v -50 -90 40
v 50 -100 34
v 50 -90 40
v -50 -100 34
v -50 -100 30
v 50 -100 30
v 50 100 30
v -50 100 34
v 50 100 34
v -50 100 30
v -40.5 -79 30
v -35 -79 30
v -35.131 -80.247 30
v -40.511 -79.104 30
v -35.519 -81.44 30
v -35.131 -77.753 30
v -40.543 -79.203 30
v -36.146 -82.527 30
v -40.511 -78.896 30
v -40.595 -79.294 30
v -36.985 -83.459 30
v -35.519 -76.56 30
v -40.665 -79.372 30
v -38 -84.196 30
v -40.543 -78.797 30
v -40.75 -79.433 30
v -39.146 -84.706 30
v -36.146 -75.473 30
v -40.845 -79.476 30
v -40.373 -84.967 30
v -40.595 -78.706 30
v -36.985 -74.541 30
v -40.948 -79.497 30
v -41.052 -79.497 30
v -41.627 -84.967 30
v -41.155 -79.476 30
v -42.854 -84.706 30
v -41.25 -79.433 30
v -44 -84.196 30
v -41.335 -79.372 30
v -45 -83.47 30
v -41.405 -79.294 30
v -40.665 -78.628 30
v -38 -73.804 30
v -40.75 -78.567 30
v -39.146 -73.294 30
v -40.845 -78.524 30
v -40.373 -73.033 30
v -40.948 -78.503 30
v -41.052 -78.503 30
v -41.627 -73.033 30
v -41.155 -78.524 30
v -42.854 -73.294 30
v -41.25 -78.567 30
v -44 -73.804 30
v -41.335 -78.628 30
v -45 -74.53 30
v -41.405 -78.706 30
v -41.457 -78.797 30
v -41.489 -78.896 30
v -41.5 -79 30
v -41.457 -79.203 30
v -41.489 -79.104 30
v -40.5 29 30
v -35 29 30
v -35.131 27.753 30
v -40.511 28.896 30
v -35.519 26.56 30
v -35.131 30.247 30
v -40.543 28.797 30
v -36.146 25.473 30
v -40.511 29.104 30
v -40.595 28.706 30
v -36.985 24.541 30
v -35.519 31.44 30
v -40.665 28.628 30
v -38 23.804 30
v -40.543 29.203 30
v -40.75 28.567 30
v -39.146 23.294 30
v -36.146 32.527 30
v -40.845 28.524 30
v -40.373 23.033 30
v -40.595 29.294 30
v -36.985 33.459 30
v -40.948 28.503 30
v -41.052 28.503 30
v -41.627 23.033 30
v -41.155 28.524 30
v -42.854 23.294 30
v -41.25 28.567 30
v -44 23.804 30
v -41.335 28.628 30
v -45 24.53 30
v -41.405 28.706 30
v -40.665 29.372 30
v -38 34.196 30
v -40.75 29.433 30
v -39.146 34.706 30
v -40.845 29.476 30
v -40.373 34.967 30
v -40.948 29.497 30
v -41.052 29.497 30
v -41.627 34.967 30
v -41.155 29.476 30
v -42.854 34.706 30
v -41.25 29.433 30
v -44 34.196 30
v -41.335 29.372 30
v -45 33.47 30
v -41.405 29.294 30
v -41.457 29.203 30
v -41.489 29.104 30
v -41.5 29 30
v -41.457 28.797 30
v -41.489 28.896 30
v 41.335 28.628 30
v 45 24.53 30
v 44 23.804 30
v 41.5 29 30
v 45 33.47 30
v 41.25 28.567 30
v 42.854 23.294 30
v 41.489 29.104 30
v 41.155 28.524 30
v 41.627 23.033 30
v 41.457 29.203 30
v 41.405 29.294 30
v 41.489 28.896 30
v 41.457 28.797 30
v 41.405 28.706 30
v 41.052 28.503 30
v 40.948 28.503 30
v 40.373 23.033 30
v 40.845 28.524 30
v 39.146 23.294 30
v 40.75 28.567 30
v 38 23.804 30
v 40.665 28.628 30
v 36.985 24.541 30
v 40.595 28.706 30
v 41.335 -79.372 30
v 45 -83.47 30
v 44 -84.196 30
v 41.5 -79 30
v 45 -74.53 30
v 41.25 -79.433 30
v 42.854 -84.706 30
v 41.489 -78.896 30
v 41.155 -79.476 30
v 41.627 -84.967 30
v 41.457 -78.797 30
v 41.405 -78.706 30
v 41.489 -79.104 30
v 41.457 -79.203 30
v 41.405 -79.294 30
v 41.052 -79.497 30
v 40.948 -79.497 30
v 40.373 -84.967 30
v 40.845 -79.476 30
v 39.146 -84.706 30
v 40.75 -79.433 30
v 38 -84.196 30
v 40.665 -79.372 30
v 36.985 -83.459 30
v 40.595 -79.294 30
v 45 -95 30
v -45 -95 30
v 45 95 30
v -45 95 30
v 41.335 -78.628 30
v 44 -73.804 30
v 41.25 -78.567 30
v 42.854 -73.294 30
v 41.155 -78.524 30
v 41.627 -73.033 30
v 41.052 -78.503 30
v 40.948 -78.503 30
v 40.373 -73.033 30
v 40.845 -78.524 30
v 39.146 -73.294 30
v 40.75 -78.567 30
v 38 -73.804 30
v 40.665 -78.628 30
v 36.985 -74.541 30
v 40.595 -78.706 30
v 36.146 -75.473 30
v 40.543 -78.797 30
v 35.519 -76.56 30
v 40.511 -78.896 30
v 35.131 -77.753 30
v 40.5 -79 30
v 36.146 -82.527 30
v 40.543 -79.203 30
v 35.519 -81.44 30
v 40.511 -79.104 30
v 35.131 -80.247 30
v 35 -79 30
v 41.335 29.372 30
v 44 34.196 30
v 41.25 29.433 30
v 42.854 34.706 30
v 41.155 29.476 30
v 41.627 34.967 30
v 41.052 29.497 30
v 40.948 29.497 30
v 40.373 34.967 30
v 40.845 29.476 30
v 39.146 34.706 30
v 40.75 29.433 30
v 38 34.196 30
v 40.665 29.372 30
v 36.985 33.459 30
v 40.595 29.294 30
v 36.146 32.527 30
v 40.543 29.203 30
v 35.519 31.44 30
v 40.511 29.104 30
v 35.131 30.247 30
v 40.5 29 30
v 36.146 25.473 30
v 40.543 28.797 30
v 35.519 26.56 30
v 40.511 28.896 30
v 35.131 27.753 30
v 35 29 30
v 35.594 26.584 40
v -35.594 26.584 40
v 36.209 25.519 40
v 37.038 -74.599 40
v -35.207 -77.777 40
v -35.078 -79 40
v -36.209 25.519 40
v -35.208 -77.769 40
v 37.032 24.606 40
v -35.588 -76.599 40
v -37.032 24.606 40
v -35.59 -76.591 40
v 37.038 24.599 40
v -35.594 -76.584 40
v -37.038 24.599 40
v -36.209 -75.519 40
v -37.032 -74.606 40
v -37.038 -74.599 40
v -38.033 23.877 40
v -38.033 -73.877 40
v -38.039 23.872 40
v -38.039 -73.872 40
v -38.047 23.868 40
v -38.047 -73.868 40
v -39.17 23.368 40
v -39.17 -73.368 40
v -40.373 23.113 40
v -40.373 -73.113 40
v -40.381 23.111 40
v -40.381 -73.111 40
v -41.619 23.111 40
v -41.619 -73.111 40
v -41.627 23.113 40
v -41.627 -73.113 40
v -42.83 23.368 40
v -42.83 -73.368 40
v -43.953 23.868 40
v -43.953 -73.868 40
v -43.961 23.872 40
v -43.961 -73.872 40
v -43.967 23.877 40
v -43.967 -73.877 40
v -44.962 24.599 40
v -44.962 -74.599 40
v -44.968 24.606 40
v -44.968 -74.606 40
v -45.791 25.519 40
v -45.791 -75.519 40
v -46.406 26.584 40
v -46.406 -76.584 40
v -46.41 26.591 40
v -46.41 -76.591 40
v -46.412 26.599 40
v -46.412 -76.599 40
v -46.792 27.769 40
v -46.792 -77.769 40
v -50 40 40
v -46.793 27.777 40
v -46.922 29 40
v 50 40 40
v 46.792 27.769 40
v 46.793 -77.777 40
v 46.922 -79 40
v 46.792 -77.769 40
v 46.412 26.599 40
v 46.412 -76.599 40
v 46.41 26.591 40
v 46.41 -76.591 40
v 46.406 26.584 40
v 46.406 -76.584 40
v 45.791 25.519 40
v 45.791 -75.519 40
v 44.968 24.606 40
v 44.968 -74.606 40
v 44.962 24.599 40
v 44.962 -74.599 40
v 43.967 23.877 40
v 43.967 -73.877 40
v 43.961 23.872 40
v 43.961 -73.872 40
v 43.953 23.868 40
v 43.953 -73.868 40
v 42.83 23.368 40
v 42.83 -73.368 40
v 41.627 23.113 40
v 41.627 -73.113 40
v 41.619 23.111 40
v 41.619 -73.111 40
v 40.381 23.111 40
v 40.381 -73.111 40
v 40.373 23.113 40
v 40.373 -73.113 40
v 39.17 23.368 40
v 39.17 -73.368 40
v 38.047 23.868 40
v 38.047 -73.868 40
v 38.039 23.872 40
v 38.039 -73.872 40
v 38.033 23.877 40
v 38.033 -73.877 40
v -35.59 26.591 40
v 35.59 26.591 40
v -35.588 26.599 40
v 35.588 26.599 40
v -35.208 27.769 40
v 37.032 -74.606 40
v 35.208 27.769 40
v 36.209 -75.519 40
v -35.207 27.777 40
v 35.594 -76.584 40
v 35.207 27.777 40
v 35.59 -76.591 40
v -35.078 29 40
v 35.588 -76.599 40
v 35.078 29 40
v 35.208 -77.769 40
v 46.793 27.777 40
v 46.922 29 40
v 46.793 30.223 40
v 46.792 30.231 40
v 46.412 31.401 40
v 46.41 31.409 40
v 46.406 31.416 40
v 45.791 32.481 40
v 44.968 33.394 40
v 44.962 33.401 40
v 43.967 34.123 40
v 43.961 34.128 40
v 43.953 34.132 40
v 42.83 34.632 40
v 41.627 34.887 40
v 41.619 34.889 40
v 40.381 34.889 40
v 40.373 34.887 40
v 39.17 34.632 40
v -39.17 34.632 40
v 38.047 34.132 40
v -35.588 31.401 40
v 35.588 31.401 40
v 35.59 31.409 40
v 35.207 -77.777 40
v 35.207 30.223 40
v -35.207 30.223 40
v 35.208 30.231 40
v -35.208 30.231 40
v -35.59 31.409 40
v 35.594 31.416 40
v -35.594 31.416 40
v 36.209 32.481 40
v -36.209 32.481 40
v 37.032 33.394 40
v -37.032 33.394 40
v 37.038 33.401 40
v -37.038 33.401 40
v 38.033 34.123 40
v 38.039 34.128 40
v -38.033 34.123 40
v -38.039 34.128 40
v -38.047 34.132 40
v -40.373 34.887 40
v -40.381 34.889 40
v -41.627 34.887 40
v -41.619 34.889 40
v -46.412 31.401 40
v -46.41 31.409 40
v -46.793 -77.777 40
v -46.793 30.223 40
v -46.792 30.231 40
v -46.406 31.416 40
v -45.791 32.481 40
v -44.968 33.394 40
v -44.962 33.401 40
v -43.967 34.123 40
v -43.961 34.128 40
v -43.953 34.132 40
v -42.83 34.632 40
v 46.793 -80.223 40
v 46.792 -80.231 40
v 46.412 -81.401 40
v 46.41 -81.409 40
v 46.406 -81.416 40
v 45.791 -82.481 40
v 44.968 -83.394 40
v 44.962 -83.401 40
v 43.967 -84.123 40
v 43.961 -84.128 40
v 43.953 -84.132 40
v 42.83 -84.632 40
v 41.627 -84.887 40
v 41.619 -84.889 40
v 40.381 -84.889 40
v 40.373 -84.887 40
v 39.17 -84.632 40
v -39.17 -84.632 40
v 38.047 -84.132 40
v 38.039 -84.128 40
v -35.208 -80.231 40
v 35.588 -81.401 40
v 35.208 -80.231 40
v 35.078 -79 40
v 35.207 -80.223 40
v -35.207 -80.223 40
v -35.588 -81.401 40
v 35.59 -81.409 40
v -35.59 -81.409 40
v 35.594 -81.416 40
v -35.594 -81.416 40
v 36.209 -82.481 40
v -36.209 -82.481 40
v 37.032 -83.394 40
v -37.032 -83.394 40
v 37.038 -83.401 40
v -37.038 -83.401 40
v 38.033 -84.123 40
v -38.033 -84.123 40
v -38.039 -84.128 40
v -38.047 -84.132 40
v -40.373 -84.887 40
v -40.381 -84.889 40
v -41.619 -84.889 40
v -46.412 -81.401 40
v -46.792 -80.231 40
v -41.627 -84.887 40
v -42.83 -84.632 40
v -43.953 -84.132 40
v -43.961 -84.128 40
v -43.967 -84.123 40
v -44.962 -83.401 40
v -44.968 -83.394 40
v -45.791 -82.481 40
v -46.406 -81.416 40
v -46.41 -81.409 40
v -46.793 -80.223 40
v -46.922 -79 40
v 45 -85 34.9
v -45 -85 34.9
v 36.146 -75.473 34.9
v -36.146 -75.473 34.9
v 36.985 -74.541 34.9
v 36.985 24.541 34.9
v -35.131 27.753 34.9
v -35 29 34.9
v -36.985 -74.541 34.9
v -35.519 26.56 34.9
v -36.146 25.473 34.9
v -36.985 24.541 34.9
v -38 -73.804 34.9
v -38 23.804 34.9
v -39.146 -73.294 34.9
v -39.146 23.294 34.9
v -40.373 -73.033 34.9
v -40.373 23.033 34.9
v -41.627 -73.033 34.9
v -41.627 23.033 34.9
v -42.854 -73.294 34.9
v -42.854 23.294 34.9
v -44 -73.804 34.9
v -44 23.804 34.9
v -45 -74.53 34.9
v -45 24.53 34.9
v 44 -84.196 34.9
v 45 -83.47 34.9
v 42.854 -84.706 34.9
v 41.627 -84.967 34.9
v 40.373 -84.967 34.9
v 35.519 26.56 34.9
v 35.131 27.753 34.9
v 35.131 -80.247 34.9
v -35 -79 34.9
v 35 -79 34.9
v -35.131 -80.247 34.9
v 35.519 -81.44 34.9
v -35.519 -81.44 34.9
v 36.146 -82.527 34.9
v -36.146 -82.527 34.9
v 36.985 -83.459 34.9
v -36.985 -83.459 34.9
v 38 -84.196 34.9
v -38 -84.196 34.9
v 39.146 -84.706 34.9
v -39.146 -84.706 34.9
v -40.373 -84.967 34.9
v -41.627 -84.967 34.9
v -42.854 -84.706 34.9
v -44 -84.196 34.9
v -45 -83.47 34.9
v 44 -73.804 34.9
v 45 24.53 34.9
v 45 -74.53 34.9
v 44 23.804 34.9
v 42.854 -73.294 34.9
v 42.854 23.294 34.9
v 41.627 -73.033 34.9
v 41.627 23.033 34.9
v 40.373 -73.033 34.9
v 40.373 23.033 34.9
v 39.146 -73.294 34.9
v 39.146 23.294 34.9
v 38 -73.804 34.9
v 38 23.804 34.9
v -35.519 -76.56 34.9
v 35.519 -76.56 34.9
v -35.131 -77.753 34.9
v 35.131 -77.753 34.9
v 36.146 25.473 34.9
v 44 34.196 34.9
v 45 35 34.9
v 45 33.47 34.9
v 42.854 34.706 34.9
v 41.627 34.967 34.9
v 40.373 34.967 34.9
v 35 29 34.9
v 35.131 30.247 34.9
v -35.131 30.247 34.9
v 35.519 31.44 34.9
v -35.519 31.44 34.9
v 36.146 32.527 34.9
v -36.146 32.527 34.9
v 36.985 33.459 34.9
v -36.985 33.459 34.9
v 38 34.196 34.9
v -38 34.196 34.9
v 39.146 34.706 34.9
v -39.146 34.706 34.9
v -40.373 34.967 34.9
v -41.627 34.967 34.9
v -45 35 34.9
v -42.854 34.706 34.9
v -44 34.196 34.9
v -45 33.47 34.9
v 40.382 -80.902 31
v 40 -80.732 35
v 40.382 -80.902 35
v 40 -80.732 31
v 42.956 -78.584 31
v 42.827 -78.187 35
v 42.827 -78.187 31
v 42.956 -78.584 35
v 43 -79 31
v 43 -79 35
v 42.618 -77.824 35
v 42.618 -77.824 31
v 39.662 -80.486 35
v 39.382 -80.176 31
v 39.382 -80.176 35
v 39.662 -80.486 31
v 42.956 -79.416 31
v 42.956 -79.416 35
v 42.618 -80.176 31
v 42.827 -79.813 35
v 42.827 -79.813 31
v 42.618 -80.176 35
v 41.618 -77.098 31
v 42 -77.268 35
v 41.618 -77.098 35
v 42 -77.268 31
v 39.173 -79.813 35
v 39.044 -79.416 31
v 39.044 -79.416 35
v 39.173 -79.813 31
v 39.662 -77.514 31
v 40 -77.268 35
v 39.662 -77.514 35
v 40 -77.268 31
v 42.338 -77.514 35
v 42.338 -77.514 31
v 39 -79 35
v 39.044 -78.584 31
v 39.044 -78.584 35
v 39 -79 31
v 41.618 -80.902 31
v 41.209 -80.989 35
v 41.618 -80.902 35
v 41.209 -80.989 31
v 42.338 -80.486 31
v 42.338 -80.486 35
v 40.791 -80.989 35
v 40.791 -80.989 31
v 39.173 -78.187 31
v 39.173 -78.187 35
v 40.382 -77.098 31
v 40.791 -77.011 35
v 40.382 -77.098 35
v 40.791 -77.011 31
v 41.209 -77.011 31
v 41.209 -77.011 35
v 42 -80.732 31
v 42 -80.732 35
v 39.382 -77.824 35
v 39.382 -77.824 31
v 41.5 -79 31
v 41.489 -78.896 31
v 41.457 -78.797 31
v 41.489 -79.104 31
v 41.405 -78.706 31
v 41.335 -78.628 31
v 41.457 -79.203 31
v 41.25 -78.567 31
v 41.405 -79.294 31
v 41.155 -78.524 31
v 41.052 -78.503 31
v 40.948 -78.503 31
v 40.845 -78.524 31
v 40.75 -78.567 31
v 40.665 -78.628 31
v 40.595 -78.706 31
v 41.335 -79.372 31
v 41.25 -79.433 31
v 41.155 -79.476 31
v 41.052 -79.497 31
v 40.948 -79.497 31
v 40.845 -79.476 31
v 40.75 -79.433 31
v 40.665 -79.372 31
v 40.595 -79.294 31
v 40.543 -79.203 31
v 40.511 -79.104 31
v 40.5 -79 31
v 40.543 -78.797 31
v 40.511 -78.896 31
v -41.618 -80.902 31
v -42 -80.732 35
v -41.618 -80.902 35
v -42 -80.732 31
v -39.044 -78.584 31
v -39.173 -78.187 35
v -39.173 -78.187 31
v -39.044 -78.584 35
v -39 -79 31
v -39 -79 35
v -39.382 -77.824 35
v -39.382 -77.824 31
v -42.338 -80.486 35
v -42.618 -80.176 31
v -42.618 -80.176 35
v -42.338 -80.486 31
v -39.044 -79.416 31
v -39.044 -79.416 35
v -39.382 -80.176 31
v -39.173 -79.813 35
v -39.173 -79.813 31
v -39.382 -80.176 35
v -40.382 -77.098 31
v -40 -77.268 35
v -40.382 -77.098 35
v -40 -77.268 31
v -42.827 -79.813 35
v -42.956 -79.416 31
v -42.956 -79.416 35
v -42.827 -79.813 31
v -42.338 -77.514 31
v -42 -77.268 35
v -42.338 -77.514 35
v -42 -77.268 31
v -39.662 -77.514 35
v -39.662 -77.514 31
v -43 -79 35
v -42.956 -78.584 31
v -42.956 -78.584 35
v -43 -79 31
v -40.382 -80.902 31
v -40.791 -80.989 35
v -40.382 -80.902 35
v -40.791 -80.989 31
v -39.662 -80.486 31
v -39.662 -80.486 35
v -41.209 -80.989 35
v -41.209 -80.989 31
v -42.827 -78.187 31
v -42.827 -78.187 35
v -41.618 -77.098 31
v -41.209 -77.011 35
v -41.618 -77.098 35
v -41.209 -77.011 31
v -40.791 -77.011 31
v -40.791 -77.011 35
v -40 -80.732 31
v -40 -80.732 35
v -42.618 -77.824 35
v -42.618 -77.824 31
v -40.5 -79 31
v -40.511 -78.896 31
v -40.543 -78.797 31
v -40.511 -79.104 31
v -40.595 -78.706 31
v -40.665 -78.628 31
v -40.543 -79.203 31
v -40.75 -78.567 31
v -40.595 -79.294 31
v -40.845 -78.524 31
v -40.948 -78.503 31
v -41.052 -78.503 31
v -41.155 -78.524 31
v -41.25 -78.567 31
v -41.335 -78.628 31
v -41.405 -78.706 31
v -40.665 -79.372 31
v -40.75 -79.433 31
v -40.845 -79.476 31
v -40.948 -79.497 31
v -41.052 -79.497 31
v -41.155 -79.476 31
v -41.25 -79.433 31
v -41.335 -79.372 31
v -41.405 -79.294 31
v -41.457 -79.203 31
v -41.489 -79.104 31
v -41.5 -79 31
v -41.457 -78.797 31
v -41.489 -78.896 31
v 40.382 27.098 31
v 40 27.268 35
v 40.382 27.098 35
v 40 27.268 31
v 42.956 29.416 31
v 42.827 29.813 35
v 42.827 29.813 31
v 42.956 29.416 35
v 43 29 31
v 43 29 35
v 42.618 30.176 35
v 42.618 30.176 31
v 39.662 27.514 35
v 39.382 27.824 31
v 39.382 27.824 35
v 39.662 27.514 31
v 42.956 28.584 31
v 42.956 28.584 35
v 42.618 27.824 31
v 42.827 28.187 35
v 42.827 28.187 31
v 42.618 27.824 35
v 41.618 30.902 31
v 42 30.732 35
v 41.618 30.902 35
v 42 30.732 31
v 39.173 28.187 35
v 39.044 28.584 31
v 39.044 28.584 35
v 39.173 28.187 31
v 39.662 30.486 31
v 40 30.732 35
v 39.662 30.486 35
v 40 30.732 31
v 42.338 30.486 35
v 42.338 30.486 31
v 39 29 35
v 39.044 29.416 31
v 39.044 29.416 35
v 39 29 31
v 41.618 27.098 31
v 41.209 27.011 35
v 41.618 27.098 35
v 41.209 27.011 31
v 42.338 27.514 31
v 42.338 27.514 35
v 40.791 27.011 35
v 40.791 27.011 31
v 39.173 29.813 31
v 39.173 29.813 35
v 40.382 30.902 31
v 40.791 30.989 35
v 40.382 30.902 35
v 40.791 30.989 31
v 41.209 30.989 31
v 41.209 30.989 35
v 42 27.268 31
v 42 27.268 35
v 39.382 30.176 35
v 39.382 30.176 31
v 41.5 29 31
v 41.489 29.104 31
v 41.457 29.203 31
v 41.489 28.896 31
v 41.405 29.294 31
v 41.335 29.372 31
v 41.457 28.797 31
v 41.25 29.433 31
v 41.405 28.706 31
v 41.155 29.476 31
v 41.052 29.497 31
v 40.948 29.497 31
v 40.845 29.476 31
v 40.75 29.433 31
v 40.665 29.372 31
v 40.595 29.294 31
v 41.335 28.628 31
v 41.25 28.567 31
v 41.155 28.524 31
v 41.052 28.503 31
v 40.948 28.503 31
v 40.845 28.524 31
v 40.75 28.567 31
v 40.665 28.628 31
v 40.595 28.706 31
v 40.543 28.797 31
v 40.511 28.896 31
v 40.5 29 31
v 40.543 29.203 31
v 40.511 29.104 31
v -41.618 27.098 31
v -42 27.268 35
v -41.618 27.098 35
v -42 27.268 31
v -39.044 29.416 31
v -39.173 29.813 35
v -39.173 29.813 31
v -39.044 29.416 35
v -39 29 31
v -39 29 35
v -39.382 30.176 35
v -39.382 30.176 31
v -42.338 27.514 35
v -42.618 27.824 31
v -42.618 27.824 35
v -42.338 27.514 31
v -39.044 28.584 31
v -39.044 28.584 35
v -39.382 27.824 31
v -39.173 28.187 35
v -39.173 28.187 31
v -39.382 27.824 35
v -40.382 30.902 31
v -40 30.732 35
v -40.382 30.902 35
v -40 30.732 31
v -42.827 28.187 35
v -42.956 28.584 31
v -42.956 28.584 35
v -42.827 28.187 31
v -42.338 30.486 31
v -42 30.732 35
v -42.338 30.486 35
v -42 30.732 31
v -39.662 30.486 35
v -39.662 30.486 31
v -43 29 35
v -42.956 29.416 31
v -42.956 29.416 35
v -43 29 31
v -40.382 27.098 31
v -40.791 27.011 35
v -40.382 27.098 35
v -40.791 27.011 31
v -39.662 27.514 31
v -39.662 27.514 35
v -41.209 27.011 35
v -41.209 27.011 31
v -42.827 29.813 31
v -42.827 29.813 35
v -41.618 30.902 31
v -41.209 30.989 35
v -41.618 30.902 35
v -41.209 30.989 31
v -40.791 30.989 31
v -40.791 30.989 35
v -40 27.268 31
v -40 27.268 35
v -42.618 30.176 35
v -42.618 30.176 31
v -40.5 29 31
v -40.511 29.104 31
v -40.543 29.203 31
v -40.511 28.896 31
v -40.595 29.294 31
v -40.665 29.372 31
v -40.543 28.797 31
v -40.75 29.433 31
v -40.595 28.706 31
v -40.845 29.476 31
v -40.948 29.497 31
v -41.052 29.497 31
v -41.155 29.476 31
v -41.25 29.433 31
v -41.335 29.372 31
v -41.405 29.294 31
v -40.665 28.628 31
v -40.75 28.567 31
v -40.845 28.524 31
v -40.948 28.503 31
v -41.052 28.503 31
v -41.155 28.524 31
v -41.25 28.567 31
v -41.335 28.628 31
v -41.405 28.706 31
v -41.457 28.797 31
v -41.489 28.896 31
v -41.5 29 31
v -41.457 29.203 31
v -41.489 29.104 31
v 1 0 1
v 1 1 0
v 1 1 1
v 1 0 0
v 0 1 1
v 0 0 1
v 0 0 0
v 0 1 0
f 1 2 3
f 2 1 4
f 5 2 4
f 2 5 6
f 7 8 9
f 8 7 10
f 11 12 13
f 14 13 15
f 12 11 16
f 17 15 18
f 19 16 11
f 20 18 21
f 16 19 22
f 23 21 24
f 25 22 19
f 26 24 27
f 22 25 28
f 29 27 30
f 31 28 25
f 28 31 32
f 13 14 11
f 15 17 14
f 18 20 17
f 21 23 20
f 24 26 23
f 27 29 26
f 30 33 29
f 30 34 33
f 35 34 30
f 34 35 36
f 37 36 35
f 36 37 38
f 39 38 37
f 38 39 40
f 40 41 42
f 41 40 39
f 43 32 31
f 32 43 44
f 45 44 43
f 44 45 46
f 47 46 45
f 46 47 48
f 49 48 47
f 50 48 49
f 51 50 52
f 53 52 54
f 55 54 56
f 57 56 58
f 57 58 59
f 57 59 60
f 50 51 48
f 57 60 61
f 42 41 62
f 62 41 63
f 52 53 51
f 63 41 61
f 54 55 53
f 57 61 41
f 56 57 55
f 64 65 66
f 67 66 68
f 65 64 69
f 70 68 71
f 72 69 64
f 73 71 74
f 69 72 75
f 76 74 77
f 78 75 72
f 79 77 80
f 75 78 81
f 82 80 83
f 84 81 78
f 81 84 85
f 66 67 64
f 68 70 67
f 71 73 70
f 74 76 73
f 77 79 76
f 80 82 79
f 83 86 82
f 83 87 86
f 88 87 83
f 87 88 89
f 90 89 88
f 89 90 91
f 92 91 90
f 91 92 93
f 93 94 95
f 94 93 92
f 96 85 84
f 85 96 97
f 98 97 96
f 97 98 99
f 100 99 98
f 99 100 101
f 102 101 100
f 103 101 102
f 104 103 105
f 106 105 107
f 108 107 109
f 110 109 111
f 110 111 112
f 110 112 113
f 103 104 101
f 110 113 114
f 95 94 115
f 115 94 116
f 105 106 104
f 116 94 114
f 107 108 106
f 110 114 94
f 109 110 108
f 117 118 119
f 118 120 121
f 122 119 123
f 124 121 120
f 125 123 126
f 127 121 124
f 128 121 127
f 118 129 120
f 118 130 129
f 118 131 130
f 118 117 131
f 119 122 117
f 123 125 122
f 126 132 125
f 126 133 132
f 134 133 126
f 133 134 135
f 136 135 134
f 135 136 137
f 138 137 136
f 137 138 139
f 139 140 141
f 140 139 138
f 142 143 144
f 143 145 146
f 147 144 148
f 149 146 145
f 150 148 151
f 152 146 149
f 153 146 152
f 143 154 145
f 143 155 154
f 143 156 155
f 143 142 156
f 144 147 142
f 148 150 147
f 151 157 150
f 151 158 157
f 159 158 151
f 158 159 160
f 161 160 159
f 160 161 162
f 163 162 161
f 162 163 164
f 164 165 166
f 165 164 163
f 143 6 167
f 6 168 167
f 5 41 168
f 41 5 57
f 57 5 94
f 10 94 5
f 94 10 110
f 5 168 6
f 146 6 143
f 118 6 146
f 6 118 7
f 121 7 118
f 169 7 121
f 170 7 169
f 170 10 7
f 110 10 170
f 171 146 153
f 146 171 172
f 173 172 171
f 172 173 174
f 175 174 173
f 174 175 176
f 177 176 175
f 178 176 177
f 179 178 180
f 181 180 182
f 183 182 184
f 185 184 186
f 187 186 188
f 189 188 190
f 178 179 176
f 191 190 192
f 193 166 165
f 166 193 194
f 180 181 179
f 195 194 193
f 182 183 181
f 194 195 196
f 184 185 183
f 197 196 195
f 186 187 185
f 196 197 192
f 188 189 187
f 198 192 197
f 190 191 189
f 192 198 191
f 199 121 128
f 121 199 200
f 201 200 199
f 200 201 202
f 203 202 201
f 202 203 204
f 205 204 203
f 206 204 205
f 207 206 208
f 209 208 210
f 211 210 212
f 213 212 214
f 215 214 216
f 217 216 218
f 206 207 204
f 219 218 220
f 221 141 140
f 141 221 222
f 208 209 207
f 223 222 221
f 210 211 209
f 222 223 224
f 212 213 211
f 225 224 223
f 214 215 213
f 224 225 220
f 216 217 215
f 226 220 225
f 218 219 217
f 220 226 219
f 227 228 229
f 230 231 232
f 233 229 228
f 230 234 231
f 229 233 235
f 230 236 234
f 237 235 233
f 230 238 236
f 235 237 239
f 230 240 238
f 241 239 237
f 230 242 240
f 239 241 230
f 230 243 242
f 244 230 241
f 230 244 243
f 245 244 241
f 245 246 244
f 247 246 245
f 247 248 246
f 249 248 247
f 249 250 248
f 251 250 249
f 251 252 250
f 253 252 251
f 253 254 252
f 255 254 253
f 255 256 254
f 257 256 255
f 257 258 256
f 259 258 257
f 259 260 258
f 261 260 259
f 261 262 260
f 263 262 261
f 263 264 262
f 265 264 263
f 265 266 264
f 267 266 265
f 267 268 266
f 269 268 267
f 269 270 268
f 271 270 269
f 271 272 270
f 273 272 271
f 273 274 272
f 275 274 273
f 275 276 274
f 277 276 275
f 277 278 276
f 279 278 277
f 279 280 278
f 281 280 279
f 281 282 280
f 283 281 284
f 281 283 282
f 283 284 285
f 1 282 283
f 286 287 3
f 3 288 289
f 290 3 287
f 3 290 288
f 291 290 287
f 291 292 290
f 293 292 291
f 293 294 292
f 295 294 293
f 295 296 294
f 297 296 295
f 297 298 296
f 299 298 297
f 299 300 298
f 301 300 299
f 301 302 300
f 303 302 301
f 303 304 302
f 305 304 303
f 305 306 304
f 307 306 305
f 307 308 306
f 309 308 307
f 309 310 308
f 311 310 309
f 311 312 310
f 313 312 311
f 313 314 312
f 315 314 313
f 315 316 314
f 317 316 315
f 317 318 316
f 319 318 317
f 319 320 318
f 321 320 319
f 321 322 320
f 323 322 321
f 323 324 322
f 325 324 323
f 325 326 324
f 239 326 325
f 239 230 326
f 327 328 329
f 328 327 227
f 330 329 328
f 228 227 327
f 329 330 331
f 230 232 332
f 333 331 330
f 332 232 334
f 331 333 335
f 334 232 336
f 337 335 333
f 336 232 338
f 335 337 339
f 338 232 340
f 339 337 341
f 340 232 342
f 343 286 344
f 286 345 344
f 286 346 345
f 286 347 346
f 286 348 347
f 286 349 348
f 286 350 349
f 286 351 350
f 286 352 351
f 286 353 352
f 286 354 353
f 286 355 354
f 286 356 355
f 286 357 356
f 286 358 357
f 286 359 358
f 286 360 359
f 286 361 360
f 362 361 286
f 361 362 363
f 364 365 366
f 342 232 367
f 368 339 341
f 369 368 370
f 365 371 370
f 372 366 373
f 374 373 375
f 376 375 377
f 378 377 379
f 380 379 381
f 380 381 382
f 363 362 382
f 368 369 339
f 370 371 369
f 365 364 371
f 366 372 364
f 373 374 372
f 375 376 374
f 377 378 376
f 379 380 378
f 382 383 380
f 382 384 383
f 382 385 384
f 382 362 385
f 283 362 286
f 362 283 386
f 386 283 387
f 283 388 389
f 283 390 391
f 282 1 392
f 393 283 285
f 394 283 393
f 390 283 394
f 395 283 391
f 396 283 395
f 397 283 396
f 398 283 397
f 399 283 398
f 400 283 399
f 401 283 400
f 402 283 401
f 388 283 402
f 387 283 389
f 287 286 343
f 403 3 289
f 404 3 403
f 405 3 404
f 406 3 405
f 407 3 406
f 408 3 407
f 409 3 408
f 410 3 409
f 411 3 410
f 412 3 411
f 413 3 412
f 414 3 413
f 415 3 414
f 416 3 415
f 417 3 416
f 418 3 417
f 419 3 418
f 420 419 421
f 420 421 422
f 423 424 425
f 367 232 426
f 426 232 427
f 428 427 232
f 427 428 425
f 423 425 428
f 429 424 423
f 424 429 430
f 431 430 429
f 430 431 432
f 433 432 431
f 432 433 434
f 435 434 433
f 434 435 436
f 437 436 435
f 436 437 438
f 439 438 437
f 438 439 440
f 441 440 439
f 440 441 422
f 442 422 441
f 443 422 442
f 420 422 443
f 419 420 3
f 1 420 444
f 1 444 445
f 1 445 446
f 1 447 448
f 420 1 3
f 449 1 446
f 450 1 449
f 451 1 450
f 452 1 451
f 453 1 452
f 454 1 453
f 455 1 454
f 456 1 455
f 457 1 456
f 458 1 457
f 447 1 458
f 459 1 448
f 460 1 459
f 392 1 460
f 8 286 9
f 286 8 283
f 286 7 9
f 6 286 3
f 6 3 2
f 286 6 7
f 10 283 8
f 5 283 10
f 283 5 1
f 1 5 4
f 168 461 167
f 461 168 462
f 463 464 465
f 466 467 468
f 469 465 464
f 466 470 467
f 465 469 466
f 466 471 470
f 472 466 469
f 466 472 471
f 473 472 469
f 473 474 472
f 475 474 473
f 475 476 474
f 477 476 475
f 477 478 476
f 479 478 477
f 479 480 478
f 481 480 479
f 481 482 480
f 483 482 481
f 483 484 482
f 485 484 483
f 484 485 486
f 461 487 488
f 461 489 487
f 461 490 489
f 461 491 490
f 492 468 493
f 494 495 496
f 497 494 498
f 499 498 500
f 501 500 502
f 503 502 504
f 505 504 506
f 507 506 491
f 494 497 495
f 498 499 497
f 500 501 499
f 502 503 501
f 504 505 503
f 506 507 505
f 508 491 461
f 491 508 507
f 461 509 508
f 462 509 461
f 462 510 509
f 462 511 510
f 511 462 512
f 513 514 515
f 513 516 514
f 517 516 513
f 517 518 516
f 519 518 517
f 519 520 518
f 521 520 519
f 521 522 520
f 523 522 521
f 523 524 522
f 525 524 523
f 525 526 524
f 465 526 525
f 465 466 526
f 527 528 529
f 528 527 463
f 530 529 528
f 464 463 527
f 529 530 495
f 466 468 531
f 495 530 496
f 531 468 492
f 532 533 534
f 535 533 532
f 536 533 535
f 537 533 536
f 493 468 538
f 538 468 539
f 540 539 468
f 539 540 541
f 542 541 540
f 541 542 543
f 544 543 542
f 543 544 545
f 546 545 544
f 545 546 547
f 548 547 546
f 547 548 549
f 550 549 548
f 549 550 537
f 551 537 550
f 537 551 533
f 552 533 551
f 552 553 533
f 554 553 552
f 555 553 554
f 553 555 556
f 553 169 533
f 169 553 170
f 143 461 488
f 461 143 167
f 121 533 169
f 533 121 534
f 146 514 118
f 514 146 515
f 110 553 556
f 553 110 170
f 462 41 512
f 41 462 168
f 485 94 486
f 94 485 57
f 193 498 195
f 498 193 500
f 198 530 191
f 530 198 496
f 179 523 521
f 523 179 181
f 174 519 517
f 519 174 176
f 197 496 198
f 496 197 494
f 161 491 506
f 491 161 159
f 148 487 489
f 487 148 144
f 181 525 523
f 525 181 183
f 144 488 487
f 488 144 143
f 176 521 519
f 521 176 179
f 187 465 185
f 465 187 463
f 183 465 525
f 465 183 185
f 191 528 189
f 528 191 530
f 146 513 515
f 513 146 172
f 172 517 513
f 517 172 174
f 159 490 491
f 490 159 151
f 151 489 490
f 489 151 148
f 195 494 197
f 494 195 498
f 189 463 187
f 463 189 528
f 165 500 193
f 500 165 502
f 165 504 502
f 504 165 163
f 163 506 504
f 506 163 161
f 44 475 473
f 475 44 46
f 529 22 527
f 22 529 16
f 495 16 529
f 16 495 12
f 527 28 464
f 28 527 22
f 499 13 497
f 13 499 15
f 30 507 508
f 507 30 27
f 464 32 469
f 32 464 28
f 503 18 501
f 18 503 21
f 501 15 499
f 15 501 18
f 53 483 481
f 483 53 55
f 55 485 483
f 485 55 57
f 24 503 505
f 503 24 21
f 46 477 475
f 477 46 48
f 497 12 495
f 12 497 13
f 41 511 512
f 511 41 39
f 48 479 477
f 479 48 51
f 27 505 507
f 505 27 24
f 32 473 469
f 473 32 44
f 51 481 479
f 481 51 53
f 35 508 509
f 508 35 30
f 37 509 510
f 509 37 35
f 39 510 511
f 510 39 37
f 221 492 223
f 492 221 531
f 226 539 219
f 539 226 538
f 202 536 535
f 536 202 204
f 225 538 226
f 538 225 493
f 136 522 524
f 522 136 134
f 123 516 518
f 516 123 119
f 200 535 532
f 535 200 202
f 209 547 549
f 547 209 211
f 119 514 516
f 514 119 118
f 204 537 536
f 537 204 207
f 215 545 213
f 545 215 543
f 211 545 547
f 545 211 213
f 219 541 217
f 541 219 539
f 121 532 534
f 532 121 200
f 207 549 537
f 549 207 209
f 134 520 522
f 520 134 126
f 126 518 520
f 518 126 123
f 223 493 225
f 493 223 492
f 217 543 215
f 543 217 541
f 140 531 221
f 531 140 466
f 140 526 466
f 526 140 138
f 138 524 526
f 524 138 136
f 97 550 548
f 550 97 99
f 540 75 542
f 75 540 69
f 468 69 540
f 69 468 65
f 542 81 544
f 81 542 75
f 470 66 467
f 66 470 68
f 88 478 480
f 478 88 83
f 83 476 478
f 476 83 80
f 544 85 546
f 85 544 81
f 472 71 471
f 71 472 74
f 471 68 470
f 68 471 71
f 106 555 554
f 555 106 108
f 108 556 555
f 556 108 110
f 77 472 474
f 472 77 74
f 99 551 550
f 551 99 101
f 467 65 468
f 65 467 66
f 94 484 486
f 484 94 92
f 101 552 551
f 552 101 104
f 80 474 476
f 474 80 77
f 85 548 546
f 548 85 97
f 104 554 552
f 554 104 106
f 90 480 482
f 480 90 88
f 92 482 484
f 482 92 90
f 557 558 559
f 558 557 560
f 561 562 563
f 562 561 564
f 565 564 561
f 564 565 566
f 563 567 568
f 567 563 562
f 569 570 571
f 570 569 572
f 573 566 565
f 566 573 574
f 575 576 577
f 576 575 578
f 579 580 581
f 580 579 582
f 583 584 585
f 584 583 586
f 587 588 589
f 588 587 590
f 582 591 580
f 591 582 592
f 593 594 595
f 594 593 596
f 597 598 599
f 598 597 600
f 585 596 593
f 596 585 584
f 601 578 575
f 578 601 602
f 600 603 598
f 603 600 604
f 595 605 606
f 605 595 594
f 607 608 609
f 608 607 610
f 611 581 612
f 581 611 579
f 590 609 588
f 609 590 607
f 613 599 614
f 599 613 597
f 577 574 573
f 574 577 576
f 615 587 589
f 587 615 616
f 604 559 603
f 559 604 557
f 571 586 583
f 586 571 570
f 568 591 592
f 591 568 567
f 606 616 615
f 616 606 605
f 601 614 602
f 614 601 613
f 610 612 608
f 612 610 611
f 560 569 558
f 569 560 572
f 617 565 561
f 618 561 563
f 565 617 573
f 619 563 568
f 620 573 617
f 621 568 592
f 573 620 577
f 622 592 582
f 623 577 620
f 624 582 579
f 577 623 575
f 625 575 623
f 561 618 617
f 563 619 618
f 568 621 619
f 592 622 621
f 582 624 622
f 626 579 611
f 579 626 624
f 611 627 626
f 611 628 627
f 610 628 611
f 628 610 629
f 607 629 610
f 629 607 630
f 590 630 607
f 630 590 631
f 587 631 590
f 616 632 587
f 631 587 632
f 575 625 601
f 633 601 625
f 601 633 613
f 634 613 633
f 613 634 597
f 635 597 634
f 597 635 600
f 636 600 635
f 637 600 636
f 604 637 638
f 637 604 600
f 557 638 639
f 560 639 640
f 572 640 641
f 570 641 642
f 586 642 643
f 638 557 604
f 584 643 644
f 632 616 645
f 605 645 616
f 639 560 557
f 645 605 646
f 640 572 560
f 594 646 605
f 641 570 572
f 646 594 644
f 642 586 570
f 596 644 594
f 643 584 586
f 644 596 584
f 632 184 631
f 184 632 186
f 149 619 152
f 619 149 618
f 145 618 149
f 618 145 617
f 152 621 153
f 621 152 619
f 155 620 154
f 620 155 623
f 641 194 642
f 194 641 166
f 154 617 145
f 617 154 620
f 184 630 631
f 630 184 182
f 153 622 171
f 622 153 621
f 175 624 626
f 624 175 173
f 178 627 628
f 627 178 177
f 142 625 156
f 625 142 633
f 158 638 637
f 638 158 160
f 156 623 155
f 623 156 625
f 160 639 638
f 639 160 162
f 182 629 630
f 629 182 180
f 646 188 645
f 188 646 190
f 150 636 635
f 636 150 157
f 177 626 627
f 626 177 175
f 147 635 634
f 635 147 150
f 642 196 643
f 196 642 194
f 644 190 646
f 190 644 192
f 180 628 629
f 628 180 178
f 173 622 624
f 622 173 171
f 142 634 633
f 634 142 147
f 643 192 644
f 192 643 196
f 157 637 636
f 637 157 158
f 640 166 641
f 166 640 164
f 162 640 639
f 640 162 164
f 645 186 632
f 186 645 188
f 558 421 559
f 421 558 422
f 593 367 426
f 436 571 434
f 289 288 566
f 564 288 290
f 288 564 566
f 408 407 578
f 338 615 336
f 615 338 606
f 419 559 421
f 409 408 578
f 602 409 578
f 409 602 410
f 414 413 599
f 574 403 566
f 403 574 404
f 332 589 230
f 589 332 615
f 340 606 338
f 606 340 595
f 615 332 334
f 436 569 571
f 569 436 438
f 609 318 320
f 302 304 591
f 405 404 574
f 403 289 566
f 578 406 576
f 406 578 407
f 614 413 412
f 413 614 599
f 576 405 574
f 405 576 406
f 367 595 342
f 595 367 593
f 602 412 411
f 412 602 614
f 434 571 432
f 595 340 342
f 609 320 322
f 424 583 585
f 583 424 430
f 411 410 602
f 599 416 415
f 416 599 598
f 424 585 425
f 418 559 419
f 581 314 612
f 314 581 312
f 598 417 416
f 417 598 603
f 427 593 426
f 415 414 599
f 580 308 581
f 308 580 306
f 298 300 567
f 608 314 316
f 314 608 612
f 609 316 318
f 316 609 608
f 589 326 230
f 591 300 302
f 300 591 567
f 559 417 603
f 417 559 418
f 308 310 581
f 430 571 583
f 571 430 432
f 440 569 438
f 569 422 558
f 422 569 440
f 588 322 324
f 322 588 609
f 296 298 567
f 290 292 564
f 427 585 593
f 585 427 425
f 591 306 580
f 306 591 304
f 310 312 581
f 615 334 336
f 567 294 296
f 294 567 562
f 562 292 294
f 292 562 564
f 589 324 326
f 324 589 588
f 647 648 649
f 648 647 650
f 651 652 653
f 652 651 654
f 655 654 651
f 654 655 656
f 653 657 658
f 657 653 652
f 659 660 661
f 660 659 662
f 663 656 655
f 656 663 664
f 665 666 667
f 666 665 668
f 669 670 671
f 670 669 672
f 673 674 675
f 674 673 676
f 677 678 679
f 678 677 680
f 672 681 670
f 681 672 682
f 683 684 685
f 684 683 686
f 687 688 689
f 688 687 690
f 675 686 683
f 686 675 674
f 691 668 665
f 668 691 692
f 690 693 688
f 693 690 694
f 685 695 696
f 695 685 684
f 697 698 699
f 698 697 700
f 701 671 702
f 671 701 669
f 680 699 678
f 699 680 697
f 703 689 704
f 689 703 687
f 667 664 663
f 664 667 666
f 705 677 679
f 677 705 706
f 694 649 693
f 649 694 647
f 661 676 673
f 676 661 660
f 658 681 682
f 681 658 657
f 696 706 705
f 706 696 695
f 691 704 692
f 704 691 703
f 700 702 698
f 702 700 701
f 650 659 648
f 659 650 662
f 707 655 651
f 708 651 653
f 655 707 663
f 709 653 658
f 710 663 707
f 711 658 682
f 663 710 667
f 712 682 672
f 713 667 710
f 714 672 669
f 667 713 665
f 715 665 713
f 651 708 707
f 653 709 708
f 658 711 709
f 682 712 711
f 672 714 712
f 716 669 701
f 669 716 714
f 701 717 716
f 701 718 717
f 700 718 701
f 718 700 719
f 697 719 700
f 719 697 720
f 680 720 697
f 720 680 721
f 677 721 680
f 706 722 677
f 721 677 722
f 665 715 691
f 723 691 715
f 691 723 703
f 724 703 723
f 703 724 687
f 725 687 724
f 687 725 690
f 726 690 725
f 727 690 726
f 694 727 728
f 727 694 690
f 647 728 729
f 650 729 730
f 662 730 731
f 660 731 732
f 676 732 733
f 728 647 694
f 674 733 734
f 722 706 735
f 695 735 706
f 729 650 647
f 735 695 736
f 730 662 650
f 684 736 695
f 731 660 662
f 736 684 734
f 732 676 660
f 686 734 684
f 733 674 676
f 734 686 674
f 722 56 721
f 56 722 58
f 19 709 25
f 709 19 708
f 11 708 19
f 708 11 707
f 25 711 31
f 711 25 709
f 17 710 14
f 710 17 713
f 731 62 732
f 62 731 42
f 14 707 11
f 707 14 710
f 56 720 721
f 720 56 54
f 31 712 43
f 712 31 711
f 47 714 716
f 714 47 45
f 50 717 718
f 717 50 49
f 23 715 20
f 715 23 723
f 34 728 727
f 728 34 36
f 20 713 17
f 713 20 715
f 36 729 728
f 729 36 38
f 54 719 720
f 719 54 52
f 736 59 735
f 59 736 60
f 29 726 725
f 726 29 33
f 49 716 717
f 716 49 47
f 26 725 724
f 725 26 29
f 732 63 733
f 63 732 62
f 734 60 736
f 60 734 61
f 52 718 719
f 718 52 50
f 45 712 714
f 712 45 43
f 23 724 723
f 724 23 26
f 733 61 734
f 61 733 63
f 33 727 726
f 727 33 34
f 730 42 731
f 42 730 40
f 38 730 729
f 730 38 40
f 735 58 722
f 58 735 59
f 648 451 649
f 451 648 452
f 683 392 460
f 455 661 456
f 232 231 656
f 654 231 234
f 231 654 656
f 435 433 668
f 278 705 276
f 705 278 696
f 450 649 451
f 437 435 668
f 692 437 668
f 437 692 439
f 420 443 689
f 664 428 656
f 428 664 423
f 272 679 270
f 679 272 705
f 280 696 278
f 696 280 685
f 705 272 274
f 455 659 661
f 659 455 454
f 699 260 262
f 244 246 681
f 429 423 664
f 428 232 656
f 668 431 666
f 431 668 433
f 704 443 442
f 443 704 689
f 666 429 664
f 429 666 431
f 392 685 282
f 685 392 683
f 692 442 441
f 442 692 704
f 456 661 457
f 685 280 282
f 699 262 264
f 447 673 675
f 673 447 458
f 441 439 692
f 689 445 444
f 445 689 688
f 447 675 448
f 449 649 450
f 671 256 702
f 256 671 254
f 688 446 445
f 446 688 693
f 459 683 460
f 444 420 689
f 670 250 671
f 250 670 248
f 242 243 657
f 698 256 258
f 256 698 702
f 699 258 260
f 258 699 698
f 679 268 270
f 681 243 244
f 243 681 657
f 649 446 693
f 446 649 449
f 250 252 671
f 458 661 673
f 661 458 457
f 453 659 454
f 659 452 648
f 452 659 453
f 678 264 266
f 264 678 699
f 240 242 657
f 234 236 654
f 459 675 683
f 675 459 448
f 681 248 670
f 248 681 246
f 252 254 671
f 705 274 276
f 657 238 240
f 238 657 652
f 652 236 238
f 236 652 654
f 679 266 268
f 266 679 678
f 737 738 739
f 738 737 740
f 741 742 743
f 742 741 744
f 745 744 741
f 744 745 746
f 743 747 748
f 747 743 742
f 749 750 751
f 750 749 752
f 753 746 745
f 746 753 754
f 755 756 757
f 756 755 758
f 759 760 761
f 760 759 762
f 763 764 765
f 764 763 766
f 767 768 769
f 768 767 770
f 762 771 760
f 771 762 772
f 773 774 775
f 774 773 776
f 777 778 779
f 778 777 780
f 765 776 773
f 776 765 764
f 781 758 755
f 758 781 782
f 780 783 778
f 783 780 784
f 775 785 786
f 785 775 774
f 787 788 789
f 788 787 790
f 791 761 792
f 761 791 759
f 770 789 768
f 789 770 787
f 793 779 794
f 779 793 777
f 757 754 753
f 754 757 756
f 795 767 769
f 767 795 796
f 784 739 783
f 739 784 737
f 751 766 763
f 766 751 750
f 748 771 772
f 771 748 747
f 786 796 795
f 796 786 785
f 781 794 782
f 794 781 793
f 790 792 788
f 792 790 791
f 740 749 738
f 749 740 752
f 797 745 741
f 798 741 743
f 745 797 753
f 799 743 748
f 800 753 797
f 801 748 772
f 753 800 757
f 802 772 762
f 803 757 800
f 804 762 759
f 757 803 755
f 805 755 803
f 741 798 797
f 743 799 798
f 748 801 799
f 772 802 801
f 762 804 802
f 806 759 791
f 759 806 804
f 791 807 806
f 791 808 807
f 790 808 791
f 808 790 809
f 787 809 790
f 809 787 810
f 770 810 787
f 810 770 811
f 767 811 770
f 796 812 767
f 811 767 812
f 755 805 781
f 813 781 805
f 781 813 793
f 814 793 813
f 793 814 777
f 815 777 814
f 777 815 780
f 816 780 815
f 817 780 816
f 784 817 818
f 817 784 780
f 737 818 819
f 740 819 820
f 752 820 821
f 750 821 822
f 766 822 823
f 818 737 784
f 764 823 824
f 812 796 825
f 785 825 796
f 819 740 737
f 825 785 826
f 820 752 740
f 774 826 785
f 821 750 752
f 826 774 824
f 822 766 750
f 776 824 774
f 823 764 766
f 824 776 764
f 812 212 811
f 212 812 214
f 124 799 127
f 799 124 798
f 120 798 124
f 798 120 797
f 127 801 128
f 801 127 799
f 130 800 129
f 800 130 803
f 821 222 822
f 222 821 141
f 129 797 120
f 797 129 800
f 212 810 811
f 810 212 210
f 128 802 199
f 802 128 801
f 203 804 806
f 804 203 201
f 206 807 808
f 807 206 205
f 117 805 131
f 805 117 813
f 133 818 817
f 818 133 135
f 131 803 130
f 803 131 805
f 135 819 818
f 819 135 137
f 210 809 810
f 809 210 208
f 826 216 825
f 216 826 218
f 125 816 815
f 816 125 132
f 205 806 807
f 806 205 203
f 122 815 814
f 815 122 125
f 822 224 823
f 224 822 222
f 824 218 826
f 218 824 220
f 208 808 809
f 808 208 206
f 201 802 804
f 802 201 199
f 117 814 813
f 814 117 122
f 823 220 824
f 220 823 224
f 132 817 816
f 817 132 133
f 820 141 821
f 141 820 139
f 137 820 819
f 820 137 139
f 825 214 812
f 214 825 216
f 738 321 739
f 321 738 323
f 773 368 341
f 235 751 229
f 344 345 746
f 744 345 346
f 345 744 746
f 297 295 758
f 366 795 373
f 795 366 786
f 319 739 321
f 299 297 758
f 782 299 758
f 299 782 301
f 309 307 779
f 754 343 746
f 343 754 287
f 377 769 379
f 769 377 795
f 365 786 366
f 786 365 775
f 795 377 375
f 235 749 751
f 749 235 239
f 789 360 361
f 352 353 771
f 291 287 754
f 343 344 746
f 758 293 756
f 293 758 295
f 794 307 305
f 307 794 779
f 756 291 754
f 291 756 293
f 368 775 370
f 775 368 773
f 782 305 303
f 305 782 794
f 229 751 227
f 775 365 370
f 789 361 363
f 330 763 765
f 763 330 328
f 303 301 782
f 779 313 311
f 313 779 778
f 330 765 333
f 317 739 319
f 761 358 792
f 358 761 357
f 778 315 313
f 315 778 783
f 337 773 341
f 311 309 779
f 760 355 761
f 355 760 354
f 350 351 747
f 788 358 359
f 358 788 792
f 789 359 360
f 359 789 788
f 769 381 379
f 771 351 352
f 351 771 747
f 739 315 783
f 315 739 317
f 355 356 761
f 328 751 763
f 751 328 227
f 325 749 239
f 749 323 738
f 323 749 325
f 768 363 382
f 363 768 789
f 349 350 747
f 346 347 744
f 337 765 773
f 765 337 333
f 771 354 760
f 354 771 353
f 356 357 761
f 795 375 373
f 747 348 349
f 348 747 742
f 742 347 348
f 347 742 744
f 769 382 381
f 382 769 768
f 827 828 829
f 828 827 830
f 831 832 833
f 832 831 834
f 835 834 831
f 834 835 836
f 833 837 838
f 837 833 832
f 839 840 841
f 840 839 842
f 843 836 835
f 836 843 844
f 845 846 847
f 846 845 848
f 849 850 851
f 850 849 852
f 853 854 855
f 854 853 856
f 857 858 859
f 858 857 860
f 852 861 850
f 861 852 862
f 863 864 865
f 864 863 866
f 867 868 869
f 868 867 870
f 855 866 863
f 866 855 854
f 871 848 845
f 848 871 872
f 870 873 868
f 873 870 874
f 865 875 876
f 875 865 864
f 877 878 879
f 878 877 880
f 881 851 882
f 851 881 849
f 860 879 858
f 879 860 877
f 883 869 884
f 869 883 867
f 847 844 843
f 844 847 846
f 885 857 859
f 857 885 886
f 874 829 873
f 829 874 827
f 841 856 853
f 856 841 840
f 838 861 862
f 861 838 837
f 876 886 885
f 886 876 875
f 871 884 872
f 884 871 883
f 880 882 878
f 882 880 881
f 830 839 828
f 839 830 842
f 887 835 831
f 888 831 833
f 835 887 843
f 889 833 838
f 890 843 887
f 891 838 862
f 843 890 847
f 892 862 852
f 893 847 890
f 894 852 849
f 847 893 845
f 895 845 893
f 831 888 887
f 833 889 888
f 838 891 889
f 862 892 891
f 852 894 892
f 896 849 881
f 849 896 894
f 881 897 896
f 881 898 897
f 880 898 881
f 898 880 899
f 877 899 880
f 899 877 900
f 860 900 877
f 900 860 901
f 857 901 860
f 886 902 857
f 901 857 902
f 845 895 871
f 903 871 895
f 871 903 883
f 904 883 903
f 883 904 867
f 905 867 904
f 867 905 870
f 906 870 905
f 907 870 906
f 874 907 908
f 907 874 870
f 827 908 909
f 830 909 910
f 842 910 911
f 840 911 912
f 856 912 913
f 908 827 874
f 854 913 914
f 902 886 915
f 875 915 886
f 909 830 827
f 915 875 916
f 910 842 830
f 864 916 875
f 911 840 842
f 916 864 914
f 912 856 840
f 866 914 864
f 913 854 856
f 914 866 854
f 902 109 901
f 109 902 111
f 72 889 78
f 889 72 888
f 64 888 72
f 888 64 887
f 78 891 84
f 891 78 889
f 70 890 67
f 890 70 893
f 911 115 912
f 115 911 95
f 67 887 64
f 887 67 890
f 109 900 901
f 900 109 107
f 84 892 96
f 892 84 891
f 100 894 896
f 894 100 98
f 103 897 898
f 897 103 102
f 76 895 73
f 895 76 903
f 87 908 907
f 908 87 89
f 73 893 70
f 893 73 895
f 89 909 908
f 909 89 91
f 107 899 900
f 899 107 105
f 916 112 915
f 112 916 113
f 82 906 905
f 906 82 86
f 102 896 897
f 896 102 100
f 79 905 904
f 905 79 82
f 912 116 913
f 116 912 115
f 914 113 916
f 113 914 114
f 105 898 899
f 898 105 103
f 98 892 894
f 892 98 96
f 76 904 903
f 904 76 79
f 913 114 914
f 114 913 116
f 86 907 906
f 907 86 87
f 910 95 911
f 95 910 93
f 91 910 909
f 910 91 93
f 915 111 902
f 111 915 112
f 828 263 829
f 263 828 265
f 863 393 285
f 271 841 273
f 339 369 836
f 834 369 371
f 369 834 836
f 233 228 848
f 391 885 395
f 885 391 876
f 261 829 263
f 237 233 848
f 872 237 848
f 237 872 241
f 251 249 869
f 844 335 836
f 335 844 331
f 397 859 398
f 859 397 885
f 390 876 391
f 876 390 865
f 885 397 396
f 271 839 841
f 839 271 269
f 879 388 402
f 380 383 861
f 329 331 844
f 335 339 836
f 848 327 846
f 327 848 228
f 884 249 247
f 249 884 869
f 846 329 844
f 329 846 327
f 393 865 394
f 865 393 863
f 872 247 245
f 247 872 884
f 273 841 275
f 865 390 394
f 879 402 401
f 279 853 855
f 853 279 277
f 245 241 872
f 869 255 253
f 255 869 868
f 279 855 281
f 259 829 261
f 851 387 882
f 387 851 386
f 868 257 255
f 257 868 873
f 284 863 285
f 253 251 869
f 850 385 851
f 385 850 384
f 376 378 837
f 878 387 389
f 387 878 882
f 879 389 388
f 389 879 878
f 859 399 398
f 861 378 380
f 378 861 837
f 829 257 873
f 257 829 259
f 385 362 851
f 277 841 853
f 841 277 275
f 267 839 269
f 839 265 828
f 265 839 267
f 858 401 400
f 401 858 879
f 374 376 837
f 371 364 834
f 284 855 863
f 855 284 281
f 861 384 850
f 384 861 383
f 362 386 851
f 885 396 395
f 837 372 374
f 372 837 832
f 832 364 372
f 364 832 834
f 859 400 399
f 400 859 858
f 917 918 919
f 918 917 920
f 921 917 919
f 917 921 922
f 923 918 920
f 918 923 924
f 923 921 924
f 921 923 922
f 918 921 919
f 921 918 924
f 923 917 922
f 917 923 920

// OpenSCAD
bodyLength=200;
bodyWidth=100;
bodyLowerHeight=30;
bodyUpperHeight=10;

bodyThickness = 5;
bodyLowerFrontSlopeLength=40;
bodyLowerFrontSlopeHeight=20;
bodyLowerBackSlopeLength=25;
bodyLowerBackSlopeHeight=25;

bodyUpperFrontSlopeLength=60;
bodyUpperFrontSlopeHeight=6;
bodyUpperBackSlopeLength=10;
bodyUpperBackSlopeHeight=6;
holeLocations=[
[((bodyWidth/2)-bodyThickness-6+2),-bodyLength/2+6+bodyThickness+bodyUpperBackSlopeLength,0],
[-((bodyWidth/2)-bodyThickness-6+2),-bodyLength/2+6+bodyThickness+bodyUpperBackSlopeLength,0],
[((bodyWidth/2)-bodyThickness-6+2),(bodyLength/2)-6-bodyThickness-bodyUpperFrontSlopeLength,0],
[-((bodyWidth/2)-bodyThickness-6+2),(bodyLength/2)-6-bodyThickness-bodyUpperFrontSlopeLength,0]
];
d=0.1;
$fn=30;

%lowerBodySection();
translate([0,0,bodyLowerHeight])
	upperBodySection();
cube([1,1,1]);

module lowerBodySection(){
holloweAngledBlockSection(
		length=bodyLength, 
		width=bodyWidth, 
	 	height=bodyLowerHeight,
	 	insetFronty=bodyLowerFrontSlopeLength,
	 	insetFrontz=bodyLowerFrontSlopeHeight, 
	 	insetBacky=bodyLowerBackSlopeLength,
	 	insetBackz=bodyLowerBackSlopeHeight);
}

module upperBodySection(){
	difference(){
		union(){
		translate([0,0,bodyUpperHeight])
			mirror([0,0,1])
				holloweAngledBlockSection(
						length=bodyLength, 
						width=bodyWidth, 
					 	height=bodyUpperHeight,
					 	insetFronty=bodyUpperFrontSlopeLength,
					 	insetFrontz=bodyUpperFrontSlopeHeight, 
					 	insetBacky=bodyUpperBackSlopeLength,
					 	insetBackz=bodyUpperBackSlopeHeight);
			// pillars
			for(index=[0:len(holeLocations)-1]){
				translate(holeLocations[index]){
					cylinder(h=bodyUpperHeight,r=6);
				}
			}
		}	
		//cut outs
		for(index=[0:len(holeLocations)-1]){
				translate(holeLocations[index]){
					screwCutout(height=bodyUpperHeight, radius=6);				
				}
					
		}
	}
}

module screwCutout(radius=6, innerRadius=2, screwRadius=0.5, ,wallThickness =1, height=20){
		translate([0,0,wallThickness]){
			cylinder(h=height+d,r=innerRadius);
		}
		translate([0,0,-d]){
			cylinder(h=height+d,r=screwRadius);
		}
		translate([0,0,height-5]){
			cylinder(h=5+d,r2=radius, r1=innerRadius);
		}
}

module holloweAngledBlockSection(
		length, 
		width, 
		height,
		insetFronty,
		insetFrontz,
		insetBacky,
		insetBackz){
	difference(){
		angledBlockSection(length=length, 
					 width=width, 
					 height=height,
					 insetFronty=insetFronty,
					 insetFrontz=insetFrontz, 
					 insetBacky=insetBacky,
					 insetBackz=insetBackz);
	
		translate([0,0,bodyThickness+d])
			angledBlockSection(length=length-bodyThickness*2, 
					 width=width-bodyThickness*2, 
					 height=height-bodyThickness,
					 insetFronty=insetFronty,
					 insetFrontz=insetFrontz, 
					 insetBacky=insetBacky,
					 insetBackz=insetBackz);
	}
}

module angledBlockSection(length, 
								 width, 
								 height,
								 insetFronty,
								 insetFrontz,
								 insetBacky,
								 insetBackz){
	hull(){
		//bottom front
		translate([-width/2,-d+length/2-insetFronty,0])
			cube([width,d,d]);

		//bottom back
		translate([-width/2,-length/2+insetBacky,0])
			cube([width,d,d]);

		//front
		translate([-width/2,-d+length/2,insetFrontz])
			cube([width,d,d]);

		//back
		translate([-width/2,-length/2,insetBackz])
			cube([width,d,d]);
		
		//upper front
		translate([-width/2,-d+length/2,height-d])
			cube([width,d,d]);

		//upper back
		translate([-width/2,-length/2,height-d])
			cube([width,d,d]);
	}
}
